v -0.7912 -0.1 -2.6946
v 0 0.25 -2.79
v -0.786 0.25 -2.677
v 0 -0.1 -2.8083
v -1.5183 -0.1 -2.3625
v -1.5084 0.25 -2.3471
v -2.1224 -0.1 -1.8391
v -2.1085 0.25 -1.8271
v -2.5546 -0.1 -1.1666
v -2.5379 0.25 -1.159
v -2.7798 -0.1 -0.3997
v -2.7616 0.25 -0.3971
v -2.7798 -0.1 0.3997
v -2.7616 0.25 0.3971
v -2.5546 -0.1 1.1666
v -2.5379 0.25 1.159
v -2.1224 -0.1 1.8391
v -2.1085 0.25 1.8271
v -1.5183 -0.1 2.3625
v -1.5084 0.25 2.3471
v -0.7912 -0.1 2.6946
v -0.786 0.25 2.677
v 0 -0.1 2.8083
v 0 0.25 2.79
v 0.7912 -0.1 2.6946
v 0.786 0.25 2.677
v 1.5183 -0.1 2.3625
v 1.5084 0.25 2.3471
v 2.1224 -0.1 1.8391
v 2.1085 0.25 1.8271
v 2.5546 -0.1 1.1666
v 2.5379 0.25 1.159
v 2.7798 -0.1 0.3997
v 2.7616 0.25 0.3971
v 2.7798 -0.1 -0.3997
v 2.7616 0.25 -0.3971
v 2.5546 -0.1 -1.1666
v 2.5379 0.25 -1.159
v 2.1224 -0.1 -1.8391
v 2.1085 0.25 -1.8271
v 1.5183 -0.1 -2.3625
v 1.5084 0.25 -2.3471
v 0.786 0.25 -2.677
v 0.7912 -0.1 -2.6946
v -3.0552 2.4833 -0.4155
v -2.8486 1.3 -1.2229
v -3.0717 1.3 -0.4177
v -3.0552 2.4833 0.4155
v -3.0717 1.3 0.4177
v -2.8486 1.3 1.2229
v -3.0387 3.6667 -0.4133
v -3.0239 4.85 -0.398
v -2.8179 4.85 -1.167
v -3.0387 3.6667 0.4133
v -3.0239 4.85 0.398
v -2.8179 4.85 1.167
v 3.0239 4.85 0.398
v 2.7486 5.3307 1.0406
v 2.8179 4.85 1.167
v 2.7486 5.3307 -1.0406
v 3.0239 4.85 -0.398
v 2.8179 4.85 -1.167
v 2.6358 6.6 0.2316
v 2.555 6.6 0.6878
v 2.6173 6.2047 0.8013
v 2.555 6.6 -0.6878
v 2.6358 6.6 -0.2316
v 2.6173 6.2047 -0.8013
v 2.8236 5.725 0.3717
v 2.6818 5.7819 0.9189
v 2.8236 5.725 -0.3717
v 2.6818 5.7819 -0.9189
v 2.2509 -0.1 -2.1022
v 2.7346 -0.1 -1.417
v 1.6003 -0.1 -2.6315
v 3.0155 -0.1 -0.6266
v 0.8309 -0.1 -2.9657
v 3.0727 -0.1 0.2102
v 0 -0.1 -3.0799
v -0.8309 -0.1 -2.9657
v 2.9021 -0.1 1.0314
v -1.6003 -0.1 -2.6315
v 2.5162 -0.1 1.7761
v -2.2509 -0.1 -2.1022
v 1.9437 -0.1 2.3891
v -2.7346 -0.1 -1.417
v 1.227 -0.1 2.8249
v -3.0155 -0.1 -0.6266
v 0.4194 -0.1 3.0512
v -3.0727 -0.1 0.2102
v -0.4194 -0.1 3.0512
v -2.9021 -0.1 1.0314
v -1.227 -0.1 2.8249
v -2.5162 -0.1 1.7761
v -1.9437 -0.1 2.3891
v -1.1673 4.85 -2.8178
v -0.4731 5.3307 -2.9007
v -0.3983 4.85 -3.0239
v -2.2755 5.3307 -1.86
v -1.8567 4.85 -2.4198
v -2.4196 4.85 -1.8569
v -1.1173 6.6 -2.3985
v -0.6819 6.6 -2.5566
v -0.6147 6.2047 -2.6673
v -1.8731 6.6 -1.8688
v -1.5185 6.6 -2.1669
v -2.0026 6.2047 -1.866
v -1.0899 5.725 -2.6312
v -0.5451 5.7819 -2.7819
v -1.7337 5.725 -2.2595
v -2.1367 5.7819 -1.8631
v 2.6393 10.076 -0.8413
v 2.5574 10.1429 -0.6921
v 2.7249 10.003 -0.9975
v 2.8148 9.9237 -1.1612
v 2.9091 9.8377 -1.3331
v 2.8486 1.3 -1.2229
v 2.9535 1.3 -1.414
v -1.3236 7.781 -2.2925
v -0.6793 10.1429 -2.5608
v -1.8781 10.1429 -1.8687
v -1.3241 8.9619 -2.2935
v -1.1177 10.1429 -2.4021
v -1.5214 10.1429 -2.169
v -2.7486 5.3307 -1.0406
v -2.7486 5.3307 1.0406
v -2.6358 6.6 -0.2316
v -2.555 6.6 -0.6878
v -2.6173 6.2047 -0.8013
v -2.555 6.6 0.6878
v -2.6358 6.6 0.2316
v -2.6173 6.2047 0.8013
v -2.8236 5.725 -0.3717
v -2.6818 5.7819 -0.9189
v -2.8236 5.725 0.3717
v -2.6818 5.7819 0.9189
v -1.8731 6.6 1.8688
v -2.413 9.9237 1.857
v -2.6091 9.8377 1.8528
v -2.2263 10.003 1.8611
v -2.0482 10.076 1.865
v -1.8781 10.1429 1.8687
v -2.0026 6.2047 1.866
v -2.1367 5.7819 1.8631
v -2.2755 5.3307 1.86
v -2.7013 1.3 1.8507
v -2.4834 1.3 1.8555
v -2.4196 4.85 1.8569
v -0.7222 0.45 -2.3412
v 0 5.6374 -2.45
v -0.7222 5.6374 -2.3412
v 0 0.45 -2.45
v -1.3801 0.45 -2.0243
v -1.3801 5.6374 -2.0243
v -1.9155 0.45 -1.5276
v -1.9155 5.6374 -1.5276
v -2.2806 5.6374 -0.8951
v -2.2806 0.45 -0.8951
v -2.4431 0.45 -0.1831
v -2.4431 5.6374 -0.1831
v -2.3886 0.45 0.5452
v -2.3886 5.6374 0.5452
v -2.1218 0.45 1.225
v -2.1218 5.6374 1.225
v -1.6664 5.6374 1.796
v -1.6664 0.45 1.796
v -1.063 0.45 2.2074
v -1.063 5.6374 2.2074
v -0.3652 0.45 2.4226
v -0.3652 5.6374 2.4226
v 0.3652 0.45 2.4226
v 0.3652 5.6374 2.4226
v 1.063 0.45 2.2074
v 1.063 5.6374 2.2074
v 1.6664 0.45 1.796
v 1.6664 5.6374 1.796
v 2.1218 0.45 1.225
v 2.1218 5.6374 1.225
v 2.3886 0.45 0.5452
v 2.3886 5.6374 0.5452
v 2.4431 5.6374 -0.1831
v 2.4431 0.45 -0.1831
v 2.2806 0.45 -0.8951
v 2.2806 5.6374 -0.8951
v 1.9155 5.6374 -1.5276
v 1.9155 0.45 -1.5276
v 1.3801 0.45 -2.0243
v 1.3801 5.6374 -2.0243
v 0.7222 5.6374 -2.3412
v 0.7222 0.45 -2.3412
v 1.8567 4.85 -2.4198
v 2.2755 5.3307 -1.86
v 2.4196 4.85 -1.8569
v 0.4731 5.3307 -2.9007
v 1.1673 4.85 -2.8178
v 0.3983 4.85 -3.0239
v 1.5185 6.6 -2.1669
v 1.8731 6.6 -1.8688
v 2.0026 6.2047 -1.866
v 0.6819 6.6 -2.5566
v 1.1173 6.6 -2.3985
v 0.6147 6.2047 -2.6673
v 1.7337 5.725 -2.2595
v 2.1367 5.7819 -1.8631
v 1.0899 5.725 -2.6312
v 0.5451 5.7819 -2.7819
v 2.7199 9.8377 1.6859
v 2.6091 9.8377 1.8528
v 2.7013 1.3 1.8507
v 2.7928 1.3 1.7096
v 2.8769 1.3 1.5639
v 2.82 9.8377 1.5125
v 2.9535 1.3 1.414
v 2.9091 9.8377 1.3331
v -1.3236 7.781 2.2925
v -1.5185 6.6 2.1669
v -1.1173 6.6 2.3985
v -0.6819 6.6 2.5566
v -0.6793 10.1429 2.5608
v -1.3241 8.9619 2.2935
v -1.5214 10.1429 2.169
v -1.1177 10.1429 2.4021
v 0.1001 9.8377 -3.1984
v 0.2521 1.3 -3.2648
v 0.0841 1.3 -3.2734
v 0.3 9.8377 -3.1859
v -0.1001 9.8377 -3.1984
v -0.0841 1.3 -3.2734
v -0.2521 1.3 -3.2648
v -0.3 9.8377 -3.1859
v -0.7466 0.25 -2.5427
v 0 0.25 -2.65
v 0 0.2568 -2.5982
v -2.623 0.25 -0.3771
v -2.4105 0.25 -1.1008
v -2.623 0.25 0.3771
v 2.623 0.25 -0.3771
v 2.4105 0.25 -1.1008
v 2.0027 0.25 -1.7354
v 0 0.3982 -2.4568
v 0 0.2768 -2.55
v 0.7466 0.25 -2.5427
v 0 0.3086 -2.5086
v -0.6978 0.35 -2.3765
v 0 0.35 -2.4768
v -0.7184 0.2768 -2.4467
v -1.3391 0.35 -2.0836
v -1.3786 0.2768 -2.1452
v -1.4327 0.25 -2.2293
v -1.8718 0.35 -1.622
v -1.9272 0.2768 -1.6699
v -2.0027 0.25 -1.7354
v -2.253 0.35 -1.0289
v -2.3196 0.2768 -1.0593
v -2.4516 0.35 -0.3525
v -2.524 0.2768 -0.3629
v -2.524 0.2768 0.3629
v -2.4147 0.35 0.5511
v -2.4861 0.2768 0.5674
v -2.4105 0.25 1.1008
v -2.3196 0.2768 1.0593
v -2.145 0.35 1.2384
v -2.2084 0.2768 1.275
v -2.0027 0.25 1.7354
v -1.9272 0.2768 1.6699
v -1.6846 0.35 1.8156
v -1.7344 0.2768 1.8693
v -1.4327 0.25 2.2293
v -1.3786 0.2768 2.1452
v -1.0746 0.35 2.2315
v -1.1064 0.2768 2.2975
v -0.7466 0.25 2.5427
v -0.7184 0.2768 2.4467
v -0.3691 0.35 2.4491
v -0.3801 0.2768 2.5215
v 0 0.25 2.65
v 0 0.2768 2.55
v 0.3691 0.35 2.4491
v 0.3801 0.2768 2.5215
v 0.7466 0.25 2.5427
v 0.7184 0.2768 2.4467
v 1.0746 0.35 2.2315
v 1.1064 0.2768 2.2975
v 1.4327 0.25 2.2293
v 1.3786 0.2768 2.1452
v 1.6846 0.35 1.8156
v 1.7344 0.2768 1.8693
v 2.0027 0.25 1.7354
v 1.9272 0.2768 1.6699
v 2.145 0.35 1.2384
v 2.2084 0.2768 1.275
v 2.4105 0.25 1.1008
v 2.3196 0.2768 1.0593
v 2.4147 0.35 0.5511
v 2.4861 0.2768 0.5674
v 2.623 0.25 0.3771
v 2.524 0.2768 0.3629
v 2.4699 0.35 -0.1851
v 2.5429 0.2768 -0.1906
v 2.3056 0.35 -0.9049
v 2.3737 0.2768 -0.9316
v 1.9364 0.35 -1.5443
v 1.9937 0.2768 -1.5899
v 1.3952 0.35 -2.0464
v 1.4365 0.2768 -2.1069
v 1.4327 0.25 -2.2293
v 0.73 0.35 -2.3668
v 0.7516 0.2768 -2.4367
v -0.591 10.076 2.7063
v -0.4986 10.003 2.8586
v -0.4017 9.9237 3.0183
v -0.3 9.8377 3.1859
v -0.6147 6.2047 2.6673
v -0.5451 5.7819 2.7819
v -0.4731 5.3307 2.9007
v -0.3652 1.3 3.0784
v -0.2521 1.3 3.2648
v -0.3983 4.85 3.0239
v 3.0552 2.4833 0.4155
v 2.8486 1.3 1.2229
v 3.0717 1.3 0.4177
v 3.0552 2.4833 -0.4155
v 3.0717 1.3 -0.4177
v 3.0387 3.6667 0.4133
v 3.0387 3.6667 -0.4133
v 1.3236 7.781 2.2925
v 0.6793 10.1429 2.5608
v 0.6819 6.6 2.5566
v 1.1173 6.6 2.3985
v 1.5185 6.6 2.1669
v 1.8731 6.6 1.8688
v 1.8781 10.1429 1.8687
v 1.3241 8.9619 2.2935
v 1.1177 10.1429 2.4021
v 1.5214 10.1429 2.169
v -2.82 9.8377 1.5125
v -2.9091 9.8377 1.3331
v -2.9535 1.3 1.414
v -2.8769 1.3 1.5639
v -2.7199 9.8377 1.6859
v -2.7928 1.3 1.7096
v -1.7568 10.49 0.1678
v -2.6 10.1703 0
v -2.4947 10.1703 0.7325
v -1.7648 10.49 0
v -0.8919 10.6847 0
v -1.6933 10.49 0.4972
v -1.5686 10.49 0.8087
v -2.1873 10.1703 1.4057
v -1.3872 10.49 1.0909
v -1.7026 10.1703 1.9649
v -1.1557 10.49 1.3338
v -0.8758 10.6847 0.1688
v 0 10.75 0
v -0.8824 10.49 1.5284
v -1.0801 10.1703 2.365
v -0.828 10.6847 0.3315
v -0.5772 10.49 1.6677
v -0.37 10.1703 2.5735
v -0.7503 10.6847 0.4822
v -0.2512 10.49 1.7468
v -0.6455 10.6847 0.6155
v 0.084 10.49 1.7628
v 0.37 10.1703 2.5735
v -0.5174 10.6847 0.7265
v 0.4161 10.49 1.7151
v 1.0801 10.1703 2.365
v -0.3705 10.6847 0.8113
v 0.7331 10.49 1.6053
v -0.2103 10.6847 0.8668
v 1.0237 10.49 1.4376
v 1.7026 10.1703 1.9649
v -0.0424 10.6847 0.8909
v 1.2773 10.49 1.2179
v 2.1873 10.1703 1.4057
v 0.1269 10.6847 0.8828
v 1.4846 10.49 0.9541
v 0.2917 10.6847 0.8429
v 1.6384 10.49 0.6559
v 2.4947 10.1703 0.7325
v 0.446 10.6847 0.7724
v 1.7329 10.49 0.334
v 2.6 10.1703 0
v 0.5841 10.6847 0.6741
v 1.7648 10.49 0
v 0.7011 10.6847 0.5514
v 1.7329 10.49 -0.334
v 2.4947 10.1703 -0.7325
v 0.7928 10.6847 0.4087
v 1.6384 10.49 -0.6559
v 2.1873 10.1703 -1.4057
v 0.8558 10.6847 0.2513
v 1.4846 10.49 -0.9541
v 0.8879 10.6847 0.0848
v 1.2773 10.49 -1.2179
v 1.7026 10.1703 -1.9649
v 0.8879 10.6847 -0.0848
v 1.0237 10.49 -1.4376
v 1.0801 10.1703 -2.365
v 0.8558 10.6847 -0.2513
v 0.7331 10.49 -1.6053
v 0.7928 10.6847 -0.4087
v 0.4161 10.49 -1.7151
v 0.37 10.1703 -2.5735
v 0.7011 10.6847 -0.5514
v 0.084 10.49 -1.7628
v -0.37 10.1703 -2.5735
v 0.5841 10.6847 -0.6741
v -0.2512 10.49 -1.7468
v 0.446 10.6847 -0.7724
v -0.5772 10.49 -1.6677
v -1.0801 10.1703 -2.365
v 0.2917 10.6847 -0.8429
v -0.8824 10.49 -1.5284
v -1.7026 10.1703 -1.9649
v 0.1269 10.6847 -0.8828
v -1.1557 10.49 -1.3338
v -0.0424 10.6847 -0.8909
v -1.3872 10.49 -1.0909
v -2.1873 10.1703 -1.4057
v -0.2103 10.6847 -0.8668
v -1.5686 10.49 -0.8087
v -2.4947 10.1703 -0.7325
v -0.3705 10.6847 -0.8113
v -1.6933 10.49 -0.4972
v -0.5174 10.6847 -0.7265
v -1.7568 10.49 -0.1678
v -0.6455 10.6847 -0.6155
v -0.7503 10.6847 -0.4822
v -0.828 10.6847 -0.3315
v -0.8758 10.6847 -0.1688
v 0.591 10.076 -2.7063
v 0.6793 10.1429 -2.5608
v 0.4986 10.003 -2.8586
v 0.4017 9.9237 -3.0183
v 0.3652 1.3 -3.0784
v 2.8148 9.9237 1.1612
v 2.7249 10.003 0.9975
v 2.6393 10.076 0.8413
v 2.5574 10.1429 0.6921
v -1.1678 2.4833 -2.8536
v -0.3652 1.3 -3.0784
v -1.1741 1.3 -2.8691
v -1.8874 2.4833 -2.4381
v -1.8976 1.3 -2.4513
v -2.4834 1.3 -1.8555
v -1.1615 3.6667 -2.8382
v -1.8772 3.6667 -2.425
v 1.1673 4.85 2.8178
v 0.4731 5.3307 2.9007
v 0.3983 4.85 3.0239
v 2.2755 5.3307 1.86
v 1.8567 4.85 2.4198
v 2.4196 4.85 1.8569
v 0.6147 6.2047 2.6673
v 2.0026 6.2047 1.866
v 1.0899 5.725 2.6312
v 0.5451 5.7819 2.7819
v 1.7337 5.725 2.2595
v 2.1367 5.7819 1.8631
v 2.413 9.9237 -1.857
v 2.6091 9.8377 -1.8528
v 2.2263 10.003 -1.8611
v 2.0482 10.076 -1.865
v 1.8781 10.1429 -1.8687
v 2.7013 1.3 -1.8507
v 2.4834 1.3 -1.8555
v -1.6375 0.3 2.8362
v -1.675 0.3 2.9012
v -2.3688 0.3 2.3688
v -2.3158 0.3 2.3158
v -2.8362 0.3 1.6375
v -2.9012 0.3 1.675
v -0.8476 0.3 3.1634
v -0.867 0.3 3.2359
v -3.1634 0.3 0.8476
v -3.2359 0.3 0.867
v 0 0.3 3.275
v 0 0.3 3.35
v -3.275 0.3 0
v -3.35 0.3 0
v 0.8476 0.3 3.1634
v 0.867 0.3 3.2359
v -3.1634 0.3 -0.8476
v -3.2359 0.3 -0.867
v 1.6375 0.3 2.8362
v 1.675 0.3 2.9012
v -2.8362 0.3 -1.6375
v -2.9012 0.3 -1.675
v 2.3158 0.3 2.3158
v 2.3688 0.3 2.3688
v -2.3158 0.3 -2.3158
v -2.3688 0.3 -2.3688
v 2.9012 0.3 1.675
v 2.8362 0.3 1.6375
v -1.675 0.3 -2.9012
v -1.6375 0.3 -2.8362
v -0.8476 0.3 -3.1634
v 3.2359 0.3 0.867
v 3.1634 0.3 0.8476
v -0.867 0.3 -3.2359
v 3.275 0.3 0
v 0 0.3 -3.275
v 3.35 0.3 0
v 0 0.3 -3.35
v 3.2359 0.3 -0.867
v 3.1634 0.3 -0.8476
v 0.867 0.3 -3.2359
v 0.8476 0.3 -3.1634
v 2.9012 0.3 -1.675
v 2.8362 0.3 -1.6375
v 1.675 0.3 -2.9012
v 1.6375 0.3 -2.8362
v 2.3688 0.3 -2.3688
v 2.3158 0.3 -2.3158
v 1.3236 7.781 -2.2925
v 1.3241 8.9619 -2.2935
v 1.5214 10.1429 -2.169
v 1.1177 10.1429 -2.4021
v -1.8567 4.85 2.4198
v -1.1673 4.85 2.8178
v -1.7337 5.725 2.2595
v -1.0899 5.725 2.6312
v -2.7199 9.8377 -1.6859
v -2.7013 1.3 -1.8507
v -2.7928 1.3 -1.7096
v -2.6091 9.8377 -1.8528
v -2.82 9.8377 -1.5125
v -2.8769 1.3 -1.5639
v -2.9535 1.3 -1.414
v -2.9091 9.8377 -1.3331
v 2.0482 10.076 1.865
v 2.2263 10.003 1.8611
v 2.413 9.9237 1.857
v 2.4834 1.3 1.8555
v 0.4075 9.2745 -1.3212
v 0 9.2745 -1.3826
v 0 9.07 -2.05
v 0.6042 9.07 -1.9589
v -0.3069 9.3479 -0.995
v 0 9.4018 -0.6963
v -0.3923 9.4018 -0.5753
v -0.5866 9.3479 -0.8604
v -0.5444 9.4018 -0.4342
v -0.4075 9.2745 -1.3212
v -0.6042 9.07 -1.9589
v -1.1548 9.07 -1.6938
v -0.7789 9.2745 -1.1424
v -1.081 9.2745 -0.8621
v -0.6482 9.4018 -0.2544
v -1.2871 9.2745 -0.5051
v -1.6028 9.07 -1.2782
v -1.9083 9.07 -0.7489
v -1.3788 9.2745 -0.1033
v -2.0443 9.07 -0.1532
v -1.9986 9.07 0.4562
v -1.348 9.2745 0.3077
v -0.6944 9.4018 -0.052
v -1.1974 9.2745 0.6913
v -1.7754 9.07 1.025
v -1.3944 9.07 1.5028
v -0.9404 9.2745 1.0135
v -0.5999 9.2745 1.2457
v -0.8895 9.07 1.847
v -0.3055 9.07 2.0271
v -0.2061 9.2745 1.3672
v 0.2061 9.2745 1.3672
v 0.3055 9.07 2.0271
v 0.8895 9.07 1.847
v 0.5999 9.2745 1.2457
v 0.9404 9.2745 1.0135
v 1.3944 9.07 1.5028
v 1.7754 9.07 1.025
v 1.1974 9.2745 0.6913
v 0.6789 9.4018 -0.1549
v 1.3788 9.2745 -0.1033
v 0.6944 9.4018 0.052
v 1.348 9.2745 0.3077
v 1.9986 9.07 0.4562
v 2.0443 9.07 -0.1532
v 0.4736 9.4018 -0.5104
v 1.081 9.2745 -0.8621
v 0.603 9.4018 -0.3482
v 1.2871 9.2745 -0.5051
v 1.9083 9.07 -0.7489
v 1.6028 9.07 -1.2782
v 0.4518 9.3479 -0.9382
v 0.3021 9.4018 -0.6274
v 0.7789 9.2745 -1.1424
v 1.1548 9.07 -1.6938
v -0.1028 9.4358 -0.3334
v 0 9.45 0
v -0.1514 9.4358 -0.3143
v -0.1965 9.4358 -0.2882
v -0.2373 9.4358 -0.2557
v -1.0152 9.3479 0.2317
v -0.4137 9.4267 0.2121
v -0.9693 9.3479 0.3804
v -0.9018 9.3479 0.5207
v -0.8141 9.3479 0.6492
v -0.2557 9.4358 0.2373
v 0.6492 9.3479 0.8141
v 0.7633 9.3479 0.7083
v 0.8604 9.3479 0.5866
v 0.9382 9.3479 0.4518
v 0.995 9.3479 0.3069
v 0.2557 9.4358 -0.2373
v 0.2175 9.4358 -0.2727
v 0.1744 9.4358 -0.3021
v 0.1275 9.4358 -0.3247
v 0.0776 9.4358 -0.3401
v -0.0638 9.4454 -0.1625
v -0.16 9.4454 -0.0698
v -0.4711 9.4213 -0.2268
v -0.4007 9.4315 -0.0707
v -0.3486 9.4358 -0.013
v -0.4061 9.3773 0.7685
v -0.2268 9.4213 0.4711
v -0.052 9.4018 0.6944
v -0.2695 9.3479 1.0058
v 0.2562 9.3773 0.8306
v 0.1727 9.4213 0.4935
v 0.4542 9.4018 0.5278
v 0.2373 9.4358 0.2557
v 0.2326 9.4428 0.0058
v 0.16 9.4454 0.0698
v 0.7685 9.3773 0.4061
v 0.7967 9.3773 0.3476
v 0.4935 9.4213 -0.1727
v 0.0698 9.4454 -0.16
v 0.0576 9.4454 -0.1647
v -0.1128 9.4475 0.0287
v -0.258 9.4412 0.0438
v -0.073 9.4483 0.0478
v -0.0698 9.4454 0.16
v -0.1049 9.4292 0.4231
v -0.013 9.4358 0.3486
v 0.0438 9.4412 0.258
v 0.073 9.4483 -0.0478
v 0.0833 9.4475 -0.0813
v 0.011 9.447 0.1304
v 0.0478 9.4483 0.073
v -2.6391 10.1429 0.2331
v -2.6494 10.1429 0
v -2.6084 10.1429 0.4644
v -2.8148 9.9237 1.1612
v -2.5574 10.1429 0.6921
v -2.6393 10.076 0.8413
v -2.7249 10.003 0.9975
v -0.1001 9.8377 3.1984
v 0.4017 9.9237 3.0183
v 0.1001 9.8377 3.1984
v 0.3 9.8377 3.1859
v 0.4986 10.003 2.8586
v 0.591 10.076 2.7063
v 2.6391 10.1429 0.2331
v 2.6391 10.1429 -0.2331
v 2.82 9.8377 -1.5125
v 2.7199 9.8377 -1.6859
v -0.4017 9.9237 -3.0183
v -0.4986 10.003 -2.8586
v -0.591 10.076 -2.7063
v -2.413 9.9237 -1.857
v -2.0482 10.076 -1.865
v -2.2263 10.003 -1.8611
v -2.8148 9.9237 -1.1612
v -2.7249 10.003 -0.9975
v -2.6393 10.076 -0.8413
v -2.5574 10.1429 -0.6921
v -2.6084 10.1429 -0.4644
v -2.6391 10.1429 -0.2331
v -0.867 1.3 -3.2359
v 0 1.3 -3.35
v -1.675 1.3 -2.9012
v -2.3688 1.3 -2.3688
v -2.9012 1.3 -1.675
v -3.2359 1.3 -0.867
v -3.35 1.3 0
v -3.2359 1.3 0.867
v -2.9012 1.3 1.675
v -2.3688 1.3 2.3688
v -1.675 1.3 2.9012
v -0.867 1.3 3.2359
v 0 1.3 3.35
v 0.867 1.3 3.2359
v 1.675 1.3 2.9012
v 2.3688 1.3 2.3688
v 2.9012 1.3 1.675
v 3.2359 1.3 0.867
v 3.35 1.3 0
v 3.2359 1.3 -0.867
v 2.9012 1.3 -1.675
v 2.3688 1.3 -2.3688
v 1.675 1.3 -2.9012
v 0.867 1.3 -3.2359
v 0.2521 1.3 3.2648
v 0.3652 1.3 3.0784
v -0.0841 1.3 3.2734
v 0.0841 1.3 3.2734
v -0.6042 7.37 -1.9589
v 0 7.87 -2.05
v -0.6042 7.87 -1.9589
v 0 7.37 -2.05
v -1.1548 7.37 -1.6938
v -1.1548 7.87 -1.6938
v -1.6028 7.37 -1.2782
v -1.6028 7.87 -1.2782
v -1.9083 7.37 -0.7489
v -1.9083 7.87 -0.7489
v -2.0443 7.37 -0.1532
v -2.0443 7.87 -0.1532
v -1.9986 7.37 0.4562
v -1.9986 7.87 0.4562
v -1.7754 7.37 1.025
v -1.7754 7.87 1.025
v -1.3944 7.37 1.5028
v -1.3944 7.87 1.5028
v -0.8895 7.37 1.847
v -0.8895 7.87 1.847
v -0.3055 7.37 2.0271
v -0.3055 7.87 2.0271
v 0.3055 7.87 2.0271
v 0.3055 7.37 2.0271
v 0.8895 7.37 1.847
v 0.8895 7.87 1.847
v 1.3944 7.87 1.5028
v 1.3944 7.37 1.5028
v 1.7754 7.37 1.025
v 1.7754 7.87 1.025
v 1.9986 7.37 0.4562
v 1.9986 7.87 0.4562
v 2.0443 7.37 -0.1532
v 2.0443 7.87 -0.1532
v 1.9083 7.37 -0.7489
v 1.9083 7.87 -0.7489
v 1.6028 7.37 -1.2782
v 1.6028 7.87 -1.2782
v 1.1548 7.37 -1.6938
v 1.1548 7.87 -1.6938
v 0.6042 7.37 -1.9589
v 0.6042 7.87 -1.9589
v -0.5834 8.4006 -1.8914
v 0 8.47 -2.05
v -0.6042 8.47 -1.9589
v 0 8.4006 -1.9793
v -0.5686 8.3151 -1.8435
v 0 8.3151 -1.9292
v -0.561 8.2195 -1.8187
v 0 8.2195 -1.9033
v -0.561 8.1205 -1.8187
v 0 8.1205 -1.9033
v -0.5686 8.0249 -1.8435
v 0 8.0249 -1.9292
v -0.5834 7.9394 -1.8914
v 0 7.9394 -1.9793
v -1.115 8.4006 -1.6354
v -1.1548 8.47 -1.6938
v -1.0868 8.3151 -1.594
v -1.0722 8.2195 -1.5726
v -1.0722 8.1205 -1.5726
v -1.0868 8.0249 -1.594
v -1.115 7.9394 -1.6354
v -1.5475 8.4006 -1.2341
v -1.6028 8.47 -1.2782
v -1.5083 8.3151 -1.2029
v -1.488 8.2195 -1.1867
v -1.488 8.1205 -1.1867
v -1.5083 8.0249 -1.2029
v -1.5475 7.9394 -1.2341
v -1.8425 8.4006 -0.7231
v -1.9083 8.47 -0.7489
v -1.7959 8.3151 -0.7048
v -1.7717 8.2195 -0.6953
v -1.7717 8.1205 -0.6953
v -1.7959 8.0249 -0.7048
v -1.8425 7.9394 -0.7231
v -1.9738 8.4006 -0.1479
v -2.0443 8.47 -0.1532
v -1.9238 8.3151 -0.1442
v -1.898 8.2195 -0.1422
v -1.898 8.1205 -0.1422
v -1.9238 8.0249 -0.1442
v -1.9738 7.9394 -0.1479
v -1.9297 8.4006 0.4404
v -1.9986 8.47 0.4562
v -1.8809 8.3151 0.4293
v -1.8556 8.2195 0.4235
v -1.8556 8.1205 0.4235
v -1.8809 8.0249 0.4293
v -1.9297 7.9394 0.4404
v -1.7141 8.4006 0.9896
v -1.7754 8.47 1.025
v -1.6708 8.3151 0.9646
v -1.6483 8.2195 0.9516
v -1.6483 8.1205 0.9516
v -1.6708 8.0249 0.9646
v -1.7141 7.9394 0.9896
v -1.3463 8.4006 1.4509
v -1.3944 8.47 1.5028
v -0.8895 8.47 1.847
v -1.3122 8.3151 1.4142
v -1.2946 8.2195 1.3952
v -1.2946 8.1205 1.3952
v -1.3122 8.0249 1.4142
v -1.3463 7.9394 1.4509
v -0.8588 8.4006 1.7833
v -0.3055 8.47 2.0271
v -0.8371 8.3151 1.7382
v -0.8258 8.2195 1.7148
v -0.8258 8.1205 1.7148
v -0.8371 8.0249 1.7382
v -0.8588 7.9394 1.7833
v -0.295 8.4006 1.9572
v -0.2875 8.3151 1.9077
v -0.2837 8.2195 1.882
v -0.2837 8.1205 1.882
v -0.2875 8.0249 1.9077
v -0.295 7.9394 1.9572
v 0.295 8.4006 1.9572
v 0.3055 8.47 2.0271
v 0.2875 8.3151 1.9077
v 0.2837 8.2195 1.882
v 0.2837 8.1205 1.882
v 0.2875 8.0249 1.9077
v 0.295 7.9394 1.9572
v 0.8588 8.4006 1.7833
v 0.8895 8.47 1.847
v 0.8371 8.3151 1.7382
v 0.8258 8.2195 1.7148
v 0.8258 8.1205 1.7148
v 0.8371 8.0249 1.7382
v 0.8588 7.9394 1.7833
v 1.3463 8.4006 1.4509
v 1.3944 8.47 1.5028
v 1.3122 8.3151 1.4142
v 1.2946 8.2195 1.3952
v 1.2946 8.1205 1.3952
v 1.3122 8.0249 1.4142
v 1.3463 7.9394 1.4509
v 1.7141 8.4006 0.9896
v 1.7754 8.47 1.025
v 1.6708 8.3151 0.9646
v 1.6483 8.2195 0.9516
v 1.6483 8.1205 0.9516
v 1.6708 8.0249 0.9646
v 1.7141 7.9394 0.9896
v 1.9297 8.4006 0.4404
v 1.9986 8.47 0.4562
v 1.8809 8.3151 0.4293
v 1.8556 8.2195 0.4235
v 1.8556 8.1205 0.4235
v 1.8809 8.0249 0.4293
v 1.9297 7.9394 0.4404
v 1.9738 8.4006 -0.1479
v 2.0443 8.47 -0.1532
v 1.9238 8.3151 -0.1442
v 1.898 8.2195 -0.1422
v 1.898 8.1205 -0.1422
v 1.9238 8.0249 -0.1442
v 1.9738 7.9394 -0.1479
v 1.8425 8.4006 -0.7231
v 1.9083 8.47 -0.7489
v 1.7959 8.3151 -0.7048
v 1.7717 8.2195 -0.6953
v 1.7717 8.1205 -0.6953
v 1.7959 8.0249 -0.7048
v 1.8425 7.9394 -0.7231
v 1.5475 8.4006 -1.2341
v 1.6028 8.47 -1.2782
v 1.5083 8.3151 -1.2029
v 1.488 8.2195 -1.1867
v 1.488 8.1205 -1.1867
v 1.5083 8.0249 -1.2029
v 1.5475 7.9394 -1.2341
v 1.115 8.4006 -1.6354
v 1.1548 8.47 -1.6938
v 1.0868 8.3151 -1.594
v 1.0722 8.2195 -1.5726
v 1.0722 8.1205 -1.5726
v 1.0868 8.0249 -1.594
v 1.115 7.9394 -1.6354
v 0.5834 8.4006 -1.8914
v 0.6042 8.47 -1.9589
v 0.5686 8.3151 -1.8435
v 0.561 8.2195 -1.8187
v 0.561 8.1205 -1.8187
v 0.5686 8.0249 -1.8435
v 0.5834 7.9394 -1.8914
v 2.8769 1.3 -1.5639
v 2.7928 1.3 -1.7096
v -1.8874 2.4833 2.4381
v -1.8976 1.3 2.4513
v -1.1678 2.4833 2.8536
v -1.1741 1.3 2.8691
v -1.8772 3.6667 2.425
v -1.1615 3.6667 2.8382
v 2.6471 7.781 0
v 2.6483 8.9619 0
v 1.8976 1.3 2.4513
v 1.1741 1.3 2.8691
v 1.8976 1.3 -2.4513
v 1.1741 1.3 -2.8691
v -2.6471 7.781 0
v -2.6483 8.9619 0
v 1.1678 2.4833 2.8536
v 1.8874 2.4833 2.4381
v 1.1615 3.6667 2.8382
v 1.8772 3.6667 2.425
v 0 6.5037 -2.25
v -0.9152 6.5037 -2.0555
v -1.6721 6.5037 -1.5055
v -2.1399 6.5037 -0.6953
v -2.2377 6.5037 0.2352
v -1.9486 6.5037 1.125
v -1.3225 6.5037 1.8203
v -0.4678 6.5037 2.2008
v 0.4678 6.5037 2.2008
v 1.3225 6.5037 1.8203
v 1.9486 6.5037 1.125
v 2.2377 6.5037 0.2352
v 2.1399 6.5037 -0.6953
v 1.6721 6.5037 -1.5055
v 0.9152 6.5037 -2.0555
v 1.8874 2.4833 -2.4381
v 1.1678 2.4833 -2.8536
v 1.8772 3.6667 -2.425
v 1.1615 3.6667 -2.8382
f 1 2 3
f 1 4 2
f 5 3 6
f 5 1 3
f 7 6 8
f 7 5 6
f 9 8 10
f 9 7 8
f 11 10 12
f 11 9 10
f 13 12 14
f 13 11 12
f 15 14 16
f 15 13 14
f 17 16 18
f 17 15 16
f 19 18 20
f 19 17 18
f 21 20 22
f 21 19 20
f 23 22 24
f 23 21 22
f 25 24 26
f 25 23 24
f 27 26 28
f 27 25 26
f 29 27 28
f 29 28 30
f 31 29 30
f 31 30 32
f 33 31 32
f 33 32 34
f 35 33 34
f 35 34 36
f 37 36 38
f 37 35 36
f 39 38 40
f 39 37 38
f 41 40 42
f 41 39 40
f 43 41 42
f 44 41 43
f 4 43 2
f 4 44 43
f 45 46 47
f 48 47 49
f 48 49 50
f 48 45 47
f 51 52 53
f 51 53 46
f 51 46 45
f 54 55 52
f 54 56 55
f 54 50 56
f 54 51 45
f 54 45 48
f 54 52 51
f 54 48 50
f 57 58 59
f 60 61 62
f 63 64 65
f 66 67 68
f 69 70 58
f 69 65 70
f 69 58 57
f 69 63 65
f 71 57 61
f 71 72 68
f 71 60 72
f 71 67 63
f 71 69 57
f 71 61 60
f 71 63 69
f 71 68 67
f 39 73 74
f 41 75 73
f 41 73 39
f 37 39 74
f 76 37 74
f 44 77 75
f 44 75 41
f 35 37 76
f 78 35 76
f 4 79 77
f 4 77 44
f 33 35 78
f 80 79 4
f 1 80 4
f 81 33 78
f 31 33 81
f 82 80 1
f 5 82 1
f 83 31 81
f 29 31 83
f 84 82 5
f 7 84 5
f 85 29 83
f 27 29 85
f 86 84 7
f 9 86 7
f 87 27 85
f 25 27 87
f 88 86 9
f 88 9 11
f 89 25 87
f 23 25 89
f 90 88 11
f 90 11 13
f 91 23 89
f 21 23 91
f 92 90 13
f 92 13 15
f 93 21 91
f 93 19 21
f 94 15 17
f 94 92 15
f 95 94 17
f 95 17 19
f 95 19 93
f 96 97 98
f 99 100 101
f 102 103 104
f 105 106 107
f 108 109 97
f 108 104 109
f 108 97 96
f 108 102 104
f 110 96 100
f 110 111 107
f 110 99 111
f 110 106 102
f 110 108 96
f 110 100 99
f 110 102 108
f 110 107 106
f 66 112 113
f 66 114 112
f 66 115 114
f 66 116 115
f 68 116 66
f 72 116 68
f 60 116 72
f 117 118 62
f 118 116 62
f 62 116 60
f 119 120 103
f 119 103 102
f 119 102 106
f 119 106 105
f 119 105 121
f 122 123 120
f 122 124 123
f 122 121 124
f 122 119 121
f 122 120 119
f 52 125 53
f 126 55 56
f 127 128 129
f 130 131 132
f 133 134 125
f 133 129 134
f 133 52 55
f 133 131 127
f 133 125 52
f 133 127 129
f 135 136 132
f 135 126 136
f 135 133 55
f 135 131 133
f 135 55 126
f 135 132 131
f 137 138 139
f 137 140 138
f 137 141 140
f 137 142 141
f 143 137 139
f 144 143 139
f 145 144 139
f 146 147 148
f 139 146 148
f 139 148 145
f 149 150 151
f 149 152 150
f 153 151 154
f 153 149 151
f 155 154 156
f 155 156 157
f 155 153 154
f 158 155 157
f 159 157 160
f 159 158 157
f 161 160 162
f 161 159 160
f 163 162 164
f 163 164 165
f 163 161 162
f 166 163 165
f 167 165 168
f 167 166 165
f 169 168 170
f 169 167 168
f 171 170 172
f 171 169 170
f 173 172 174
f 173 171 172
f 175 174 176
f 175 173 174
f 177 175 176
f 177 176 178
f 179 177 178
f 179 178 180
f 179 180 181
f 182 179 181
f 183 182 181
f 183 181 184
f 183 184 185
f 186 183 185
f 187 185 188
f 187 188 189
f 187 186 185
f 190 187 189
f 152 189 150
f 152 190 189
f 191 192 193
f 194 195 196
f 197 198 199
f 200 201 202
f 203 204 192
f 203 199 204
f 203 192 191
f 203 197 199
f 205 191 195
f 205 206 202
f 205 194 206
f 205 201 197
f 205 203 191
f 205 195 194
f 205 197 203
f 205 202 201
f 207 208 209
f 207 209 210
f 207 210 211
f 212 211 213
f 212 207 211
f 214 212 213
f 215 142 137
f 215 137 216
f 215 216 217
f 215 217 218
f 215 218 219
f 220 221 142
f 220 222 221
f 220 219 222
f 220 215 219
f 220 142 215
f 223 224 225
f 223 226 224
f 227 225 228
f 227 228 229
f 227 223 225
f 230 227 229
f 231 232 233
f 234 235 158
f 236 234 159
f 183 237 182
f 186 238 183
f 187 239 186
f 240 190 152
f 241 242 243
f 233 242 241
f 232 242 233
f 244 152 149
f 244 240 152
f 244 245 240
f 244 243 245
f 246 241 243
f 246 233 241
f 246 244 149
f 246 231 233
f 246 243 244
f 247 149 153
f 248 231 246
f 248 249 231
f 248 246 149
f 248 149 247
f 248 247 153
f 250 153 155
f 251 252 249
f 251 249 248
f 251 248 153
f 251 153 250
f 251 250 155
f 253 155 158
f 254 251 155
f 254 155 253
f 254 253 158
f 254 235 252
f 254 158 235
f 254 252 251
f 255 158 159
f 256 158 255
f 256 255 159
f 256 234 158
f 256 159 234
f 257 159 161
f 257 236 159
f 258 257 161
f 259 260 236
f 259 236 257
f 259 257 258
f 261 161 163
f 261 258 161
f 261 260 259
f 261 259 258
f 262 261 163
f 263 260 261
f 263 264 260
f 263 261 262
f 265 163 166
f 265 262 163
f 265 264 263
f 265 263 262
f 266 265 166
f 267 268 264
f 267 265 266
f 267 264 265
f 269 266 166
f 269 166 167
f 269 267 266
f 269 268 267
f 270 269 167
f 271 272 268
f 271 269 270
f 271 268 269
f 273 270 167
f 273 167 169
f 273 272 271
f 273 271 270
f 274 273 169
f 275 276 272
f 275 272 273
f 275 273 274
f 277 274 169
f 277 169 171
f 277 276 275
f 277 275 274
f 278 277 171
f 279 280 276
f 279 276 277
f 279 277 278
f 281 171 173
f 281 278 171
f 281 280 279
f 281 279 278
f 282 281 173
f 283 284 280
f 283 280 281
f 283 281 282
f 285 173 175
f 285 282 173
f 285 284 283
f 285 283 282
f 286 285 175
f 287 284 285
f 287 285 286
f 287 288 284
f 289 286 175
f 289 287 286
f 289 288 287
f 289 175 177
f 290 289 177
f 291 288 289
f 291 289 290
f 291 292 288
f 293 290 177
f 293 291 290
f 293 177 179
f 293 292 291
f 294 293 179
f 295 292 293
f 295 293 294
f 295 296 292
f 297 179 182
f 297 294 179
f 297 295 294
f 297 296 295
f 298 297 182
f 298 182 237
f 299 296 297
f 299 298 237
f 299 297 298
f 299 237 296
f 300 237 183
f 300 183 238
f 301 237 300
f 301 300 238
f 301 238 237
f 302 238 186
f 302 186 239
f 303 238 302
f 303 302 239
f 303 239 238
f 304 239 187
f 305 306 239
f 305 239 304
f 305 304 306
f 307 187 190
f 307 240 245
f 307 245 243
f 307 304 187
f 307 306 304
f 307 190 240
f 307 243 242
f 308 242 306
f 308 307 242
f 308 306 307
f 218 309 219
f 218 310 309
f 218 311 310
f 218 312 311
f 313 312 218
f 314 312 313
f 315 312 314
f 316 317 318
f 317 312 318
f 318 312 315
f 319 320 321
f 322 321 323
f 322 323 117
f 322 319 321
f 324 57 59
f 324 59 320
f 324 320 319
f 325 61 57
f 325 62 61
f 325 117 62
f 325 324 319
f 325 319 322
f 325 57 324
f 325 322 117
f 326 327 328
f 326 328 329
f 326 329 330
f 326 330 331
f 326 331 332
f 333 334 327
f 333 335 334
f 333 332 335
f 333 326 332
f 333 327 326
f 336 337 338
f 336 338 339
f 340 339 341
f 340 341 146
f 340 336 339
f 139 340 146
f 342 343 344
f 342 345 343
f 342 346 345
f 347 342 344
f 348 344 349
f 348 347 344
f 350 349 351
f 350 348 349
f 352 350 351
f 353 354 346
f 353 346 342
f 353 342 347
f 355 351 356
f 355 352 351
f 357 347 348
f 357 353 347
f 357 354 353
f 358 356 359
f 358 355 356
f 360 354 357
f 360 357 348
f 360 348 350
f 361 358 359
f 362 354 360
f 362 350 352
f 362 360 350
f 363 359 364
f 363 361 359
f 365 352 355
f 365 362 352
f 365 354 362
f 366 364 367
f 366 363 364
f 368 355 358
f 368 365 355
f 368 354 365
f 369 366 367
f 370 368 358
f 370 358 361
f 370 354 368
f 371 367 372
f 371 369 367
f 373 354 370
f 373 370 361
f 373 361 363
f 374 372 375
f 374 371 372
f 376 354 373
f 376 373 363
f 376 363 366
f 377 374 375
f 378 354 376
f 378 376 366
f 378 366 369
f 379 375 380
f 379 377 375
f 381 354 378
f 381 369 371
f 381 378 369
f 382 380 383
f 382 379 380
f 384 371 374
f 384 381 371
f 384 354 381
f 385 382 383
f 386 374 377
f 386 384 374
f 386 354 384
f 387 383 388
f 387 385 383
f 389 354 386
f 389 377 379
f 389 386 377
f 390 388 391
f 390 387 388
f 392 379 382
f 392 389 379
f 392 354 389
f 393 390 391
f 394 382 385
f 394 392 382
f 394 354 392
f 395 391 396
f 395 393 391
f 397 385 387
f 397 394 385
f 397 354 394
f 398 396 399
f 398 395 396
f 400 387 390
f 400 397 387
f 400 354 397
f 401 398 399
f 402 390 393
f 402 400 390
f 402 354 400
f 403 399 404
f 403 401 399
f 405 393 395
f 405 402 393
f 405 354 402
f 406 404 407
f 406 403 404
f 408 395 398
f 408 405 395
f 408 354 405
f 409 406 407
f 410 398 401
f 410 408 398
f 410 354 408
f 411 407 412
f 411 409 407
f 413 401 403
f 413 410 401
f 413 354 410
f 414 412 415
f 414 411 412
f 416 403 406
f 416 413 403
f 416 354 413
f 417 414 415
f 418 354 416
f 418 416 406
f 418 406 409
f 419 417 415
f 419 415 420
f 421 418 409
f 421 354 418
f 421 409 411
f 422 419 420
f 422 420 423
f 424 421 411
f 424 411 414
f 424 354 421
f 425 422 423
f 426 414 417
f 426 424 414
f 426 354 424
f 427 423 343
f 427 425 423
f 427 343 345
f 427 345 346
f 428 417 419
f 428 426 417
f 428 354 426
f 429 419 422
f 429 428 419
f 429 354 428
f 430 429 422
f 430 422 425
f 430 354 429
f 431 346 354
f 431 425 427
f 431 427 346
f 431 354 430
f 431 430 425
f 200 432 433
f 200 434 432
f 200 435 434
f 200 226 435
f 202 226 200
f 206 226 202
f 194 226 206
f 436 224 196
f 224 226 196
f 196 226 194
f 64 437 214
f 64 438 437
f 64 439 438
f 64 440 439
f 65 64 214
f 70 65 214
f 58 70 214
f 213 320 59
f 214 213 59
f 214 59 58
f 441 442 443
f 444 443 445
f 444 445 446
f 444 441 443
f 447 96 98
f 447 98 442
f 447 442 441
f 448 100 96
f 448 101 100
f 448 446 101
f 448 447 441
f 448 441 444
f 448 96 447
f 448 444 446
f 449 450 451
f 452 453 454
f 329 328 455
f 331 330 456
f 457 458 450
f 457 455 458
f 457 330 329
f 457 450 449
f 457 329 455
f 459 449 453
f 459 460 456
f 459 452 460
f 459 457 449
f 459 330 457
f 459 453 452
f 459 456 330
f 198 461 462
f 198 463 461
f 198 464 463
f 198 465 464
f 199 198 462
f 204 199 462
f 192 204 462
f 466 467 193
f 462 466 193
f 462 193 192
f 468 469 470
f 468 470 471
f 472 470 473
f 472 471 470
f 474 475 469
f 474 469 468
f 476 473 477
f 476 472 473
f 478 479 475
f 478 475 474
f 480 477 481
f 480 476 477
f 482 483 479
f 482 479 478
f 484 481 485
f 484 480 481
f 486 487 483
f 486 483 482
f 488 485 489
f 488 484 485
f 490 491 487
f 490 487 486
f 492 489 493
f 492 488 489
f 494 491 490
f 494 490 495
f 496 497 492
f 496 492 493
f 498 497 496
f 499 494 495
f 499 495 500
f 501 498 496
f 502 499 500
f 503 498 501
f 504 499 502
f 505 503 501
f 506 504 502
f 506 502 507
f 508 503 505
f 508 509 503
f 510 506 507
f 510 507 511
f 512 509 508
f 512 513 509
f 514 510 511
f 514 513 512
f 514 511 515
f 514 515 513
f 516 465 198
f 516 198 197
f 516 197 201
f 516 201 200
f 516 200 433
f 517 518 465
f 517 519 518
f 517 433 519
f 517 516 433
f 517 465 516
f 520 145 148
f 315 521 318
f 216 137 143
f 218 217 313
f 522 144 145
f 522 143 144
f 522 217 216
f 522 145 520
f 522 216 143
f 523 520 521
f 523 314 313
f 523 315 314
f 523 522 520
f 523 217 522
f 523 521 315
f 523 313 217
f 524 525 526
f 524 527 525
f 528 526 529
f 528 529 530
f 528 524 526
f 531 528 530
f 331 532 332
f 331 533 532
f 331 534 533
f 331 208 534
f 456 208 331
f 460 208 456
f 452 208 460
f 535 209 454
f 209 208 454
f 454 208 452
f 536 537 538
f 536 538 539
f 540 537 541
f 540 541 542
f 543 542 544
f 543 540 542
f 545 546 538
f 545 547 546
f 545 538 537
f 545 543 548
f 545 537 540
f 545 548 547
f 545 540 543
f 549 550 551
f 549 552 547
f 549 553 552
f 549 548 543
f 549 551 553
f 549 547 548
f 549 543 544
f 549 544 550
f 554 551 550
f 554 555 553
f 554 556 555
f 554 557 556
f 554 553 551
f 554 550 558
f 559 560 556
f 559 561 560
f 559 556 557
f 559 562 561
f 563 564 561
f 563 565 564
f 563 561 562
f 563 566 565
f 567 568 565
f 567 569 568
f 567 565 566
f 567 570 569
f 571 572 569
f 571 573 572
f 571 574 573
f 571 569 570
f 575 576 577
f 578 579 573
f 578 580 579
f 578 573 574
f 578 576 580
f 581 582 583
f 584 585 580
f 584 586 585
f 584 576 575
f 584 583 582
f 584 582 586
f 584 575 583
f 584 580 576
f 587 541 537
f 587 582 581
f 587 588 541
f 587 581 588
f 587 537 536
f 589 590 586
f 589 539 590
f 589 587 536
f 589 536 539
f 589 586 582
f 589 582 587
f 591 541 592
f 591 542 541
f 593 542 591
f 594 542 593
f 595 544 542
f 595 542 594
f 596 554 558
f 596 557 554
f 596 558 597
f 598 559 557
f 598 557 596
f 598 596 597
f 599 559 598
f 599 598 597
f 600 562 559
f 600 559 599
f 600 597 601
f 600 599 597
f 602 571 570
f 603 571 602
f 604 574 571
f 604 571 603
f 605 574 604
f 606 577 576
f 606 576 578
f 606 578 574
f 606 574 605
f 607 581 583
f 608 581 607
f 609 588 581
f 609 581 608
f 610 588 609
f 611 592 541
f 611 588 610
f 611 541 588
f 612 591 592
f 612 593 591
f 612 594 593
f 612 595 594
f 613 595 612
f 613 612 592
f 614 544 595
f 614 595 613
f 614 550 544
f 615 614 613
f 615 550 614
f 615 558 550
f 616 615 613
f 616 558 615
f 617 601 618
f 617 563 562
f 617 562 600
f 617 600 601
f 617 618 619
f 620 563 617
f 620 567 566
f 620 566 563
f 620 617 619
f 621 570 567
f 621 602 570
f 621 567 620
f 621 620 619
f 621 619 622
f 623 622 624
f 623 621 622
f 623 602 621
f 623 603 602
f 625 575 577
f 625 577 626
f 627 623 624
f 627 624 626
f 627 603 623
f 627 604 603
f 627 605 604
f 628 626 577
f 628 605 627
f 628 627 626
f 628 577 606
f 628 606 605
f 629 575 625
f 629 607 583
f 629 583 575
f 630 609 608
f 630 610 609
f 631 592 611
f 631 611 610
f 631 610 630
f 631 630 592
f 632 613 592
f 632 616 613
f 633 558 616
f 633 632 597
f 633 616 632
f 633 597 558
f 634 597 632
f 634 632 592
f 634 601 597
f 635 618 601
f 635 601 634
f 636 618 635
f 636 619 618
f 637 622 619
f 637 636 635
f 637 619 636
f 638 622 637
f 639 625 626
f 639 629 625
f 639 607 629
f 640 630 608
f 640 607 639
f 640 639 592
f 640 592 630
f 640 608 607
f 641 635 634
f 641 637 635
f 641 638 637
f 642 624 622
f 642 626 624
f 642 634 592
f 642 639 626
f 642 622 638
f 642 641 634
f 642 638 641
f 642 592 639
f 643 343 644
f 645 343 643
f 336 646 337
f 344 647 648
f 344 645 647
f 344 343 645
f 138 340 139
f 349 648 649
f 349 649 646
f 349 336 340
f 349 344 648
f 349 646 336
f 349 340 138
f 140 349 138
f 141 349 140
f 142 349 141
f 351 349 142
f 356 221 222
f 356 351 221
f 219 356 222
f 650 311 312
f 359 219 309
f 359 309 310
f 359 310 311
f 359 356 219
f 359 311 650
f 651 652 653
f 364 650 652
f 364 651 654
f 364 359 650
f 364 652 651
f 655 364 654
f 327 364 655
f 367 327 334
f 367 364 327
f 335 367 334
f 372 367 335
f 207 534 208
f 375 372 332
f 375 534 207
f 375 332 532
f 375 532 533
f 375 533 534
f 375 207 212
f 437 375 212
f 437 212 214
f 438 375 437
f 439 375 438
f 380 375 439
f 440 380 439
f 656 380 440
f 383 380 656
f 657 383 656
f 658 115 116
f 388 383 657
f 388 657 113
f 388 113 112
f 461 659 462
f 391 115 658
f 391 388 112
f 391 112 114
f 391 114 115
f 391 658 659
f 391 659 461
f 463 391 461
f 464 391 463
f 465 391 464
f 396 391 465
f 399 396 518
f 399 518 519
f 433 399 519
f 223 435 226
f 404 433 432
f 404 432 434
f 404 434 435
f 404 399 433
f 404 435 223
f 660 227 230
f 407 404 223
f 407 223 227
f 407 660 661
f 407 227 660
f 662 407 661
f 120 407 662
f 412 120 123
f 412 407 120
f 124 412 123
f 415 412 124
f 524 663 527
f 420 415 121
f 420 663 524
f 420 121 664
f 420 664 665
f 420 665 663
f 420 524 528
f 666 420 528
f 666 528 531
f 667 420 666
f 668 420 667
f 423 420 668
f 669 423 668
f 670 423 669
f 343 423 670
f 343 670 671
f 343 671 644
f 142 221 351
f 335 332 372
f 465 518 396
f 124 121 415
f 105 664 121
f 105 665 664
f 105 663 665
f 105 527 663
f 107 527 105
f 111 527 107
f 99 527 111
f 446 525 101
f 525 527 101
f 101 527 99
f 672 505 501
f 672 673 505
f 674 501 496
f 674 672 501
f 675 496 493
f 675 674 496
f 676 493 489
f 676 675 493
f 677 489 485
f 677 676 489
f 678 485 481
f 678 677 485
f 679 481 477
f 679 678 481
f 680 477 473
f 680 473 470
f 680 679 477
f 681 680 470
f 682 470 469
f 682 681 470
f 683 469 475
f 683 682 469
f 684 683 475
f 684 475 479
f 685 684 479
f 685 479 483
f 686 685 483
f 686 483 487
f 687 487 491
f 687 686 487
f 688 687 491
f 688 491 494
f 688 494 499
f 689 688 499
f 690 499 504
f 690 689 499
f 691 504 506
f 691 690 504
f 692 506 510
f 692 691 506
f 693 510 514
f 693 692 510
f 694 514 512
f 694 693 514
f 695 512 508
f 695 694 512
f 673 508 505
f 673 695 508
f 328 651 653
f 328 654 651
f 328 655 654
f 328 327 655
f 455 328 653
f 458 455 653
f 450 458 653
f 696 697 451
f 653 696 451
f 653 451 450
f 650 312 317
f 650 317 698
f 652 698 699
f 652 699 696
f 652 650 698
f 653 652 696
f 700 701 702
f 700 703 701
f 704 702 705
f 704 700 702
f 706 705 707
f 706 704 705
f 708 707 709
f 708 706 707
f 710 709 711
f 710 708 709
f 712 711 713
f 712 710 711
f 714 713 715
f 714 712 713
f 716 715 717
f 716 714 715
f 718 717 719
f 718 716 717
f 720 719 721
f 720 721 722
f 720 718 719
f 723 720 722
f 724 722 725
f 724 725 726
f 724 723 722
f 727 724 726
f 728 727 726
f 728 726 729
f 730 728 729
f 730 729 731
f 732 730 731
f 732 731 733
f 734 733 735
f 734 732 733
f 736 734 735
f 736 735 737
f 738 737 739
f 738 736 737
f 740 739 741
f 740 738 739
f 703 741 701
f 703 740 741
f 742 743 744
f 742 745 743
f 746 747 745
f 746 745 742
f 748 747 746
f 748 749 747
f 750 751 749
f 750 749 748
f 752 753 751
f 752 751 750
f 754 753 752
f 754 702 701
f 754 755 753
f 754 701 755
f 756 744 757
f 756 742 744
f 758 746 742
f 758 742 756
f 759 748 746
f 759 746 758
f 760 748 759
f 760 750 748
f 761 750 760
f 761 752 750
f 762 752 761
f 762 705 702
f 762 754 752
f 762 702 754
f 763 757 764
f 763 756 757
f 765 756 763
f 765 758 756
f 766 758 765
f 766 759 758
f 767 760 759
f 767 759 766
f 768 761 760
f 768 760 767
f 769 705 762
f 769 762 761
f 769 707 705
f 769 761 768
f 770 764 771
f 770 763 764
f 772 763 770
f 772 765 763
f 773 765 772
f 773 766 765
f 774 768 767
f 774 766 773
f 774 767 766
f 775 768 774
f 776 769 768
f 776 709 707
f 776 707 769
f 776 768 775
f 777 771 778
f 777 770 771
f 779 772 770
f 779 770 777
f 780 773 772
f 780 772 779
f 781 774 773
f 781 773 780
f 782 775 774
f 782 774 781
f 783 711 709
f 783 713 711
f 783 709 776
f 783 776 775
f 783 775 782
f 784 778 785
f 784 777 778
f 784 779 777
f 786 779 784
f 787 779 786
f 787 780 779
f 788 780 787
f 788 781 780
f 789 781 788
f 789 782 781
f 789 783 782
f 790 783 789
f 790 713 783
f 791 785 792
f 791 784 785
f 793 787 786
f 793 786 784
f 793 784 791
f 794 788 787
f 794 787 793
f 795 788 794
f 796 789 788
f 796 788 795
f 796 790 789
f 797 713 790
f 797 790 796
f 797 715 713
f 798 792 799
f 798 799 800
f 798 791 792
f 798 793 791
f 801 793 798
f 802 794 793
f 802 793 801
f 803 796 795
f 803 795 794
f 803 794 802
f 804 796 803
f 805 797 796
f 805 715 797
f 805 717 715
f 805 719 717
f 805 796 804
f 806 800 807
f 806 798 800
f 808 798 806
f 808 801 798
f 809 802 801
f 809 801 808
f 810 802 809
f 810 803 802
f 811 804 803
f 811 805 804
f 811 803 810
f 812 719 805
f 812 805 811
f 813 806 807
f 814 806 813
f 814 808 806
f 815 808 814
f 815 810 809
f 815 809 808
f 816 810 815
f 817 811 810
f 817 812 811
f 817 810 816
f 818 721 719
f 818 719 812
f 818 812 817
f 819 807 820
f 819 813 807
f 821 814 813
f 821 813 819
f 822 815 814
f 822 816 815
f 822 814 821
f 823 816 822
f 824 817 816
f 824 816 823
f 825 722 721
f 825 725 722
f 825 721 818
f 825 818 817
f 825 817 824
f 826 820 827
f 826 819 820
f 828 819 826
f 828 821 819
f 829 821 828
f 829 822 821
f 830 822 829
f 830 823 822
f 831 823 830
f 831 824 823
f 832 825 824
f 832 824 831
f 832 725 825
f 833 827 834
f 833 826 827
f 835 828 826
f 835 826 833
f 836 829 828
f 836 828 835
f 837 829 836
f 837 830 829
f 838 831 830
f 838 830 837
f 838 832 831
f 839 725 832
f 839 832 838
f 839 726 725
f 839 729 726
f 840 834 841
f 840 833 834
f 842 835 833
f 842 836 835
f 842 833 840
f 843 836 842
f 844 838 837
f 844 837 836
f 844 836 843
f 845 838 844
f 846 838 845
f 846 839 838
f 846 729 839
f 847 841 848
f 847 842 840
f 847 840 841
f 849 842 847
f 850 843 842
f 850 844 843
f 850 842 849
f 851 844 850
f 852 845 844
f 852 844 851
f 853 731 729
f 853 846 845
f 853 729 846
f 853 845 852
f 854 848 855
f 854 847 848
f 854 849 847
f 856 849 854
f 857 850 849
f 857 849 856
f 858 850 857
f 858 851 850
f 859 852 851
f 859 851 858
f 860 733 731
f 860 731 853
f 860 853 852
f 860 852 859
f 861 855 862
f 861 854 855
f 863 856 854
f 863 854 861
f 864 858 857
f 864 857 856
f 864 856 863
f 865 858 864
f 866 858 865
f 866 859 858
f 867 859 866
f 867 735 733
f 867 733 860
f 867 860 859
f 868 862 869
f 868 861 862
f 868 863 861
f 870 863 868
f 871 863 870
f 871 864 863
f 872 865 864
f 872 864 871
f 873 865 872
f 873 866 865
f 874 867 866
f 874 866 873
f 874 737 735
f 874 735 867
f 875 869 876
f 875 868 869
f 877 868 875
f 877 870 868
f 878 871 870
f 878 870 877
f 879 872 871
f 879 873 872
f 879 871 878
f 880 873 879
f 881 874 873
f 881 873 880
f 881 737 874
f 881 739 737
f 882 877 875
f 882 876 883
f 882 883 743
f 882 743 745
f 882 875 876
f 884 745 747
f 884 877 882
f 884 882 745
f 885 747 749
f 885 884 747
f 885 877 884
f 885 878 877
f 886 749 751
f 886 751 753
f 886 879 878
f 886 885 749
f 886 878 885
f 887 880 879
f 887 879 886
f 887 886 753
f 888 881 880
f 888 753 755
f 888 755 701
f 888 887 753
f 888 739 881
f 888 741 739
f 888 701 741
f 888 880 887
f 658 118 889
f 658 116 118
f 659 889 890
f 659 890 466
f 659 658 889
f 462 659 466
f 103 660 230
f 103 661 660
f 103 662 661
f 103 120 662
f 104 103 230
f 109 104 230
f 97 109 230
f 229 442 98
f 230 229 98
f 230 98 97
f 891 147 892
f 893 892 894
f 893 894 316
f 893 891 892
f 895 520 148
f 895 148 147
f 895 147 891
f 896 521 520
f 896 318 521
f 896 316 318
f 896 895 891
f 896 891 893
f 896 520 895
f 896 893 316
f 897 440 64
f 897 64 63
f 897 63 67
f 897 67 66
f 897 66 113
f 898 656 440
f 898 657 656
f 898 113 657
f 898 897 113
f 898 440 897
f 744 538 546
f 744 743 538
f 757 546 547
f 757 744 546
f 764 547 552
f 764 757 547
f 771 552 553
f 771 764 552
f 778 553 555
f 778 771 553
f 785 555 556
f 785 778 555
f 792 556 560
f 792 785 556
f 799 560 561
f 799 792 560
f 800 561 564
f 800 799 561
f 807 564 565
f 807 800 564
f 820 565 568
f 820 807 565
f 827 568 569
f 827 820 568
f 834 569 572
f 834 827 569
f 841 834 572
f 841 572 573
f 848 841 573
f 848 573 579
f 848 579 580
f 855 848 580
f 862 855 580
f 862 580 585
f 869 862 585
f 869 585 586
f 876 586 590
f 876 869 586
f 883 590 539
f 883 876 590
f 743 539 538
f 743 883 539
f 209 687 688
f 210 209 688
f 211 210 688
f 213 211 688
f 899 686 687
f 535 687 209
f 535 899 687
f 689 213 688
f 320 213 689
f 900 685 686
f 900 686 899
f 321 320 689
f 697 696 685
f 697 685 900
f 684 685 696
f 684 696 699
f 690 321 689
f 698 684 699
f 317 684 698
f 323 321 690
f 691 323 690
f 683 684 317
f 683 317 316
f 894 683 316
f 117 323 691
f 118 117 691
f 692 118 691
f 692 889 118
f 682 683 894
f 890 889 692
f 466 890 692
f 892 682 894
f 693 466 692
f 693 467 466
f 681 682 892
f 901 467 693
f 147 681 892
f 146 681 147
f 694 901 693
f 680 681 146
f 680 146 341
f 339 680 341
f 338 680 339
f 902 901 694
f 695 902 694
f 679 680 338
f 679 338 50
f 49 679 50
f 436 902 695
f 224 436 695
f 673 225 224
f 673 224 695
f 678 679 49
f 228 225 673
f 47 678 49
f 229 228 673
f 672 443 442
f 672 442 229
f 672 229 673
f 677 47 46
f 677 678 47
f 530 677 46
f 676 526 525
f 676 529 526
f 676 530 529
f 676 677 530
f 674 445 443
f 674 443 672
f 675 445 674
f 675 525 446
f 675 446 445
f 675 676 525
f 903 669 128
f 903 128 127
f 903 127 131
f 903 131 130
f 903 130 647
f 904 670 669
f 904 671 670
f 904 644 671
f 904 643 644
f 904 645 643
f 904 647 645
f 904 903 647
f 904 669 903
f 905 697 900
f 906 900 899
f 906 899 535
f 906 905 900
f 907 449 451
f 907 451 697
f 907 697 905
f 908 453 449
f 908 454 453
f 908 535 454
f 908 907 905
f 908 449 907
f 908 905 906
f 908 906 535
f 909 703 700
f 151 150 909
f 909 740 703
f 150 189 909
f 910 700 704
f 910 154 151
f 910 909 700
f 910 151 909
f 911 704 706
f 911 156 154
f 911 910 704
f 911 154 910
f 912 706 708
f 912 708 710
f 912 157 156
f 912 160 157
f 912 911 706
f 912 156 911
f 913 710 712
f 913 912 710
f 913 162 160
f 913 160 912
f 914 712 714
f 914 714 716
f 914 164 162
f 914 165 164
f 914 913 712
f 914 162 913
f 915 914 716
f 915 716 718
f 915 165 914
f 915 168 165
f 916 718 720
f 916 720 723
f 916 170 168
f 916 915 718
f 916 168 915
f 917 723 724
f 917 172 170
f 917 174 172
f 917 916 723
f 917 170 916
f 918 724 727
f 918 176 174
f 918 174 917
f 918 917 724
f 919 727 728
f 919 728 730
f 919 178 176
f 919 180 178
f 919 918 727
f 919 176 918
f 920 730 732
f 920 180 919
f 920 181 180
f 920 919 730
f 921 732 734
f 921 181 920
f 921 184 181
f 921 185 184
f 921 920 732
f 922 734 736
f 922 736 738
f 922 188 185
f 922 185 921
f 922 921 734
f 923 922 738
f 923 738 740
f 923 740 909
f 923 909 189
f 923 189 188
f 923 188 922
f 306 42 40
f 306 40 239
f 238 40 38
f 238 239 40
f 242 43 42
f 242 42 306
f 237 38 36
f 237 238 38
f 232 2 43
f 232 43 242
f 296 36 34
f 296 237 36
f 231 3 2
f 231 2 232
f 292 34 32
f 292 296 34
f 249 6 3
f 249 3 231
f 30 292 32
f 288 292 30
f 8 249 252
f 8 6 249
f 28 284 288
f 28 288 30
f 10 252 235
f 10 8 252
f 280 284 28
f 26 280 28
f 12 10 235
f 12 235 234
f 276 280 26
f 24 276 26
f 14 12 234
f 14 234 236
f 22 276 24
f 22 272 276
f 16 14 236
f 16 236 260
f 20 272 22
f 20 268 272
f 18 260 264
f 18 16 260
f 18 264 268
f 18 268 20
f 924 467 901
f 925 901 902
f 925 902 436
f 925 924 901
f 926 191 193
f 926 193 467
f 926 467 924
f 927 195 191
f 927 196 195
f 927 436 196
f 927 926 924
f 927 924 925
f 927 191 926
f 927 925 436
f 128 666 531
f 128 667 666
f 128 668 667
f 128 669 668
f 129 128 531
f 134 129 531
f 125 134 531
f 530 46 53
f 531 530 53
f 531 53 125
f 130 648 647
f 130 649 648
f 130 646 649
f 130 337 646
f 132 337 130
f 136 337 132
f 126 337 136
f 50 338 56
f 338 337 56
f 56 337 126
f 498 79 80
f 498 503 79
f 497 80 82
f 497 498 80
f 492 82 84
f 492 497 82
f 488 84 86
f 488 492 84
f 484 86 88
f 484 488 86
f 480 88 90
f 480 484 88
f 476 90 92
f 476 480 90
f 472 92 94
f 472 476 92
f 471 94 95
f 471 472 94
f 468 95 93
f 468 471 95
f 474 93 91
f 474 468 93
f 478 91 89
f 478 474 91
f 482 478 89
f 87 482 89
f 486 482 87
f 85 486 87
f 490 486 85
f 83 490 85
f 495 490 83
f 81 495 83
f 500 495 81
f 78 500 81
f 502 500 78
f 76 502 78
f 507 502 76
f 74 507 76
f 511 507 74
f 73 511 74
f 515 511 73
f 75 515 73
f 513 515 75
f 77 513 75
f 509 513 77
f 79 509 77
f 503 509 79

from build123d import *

# Parameters (mm, degrees)
EXTRUS_O1_REACH       = 12.571
CIRPATTERN1_COUNT     = 6
FILETE1_R             = 0.3
ESBO_O24_R            = 3.35
CORTE_EXTRUS_O1_DEPTH = 0.3


with BuildPart() as part:
    # Esboço1 → Revolução1 (revolve)
    with BuildSketch(Plane.XY, mode=Mode.PRIVATE) as revolu_o1_sk:
        Polygon((0, 0), (-3.35, 0), (-3.35, 1.3), (-3.1, 1.3), (-3.05, 4.85), (-2.645980666, 6.6), (-2.65, 10.75), (0, 10.75), align=None)
    revolve(revolu_o1_sk.sketch.rotate(Axis((0, 0, 0), (0, 1, 0)), 270), axis=Axis((0, 0, 0), (0, 1, 0)))

    # Extrusão1: up to this face of the body (flat: up to its plane)
    extrus_o1_end = Plane(part.part.faces().sort_by_distance((0, 10.75, 0))[0])
    # Esboço2 → Extrusão1 (add, up to the picked face)
    with BuildSketch(Plane.XZ.offset(-1.3), mode=Mode.PRIVATE) as extrus_o1_sk1:
        with BuildLine():
            Line((-0.837606703, -2.3), (-0.204201147, -3.34377061))
            ThreePointArc((-0.204201147, -3.34377061), (0, -3.35), (0.204201147, -3.34377061))
            Line((0.204201147, -3.34377061), (0.837606703, -2.3))
            Line((0.837606703, -2.3), (-0.837606703, -2.3))
        make_face()
    extrus_o1_tool1 = split(extrude(extrus_o1_sk1.sketch, amount=-EXTRUS_O1_REACH, mode=Mode.PRIVATE), bisect_by=extrus_o1_end, keep=Keep.BOTH, mode=Mode.PRIVATE)
    add(extrus_o1_tool1.solids().sort_by(Axis((0, 1.3, -2.7171), (0, 1, 0)))[0])

    # CirPattern1: part ×6 about axis
    cirpattern1_axis = Axis((0, 0, 0), (0, 1, 0))


with BuildPart() as part_1:
    add(part.part)
    for i in range(1, CIRPATTERN1_COUNT):
        add(part.part.rotate(cirpattern1_axis, i * 360 / CIRPATTERN1_COUNT))

    # Esboço3 → Corte-Revolução5 (revolve, cut)
    with BuildSketch(Plane.XY):
        with BuildLine():
            Line((-3.2, 9.837667271), (-2.6, 10.170252702))
            ThreePointArc((-2.6, 10.170252702), (-1.331925949, 10.603305054), (0, 10.75))
            Line((0, 10.75), (0, 11.25))
            Line((0, 11.25), (-4, 11.25))
            Line((-4, 11.25), (-4, 1.3))
            Line((-4, 1.3), (-3.274507094, 1.3))
            Line((-3.274507094, 1.3), (-3.2, 9.837667271))
        make_face()
    revolve(axis=Axis((0, 0, 0), (0, 1, 0)), mode=Mode.SUBTRACT)

    # Filete1
    filete1_edges = [part_1.edges().sort_by_distance(p)[0] for p in [
        (0, 0, 3.35),
    ]]
    fillet(filete1_edges, radius=FILETE1_R)

    # Esboço24 → Corte-extrusão1 (cut)
    with BuildSketch(Plane.XZ):
        with Locations(Location((0, 0, 0), (0, 0, 270))):
            Circle(ESBO_O24_R)
    extrude(amount=-CORTE_EXTRUS_O1_DEPTH, mode=Mode.SUBTRACT)

    # Esboço22 → Revolução3 (revolve)
    with BuildSketch(Plane.XY, mode=Mode.PRIVATE) as revolu_o3_sk:
        Polygon((-0.5, 0.3), (-0.5, -0.1), (-3.079906965, -0.1), (-3.275, 0.3), align=None)
    revolve(revolu_o3_sk.sketch.rotate(Axis((0, 0, 0), (0, 1, 0)), 270), axis=Axis((0, 0, 0), (0, 1, 0)))

    # Esboço8 → Corte-Revolução6 (revolve, cut)
    with BuildSketch(Plane.XY, mode=Mode.PRIVATE) as corte_revolu_o6_sk:
        with BuildLine():
            Line((-2.808342723, -0.1), (0, -0.1))
            Line((0, -0.1), (0, 9.45))
            ThreePointArc((0, 9.45), (-1.041301106, 9.347940177), (-2.05, 9.07))
            Line((-2.05, 9.07), (-2.05, 8.47))
            ThreePointArc((-2.05, 8.47), (-1.9, 8.17), (-2.05, 7.87))
            Line((-2.05, 7.87), (-2.05, 7.37))
            Line((-2.05, 7.37), (-2.45, 5.63740965))
            Line((-2.45, 5.63740965), (-2.45, 0.45))
            ThreePointArc((-2.45, 0.45), (-2.508578644, 0.308578644), (-2.65, 0.25))
            Line((-2.65, 0.25), (-2.79, 0.25))
            Line((-2.79, 0.25), (-2.808342723, -0.1))
        make_face()
    revolve(corte_revolu_o6_sk.sketch.rotate(Axis((0, -0.1, 0), (0, 1, 0)), 270), axis=Axis((0, -0.1, 0), (0, 1, 0)), mode=Mode.SUBTRACT)


solid = part_1.part
